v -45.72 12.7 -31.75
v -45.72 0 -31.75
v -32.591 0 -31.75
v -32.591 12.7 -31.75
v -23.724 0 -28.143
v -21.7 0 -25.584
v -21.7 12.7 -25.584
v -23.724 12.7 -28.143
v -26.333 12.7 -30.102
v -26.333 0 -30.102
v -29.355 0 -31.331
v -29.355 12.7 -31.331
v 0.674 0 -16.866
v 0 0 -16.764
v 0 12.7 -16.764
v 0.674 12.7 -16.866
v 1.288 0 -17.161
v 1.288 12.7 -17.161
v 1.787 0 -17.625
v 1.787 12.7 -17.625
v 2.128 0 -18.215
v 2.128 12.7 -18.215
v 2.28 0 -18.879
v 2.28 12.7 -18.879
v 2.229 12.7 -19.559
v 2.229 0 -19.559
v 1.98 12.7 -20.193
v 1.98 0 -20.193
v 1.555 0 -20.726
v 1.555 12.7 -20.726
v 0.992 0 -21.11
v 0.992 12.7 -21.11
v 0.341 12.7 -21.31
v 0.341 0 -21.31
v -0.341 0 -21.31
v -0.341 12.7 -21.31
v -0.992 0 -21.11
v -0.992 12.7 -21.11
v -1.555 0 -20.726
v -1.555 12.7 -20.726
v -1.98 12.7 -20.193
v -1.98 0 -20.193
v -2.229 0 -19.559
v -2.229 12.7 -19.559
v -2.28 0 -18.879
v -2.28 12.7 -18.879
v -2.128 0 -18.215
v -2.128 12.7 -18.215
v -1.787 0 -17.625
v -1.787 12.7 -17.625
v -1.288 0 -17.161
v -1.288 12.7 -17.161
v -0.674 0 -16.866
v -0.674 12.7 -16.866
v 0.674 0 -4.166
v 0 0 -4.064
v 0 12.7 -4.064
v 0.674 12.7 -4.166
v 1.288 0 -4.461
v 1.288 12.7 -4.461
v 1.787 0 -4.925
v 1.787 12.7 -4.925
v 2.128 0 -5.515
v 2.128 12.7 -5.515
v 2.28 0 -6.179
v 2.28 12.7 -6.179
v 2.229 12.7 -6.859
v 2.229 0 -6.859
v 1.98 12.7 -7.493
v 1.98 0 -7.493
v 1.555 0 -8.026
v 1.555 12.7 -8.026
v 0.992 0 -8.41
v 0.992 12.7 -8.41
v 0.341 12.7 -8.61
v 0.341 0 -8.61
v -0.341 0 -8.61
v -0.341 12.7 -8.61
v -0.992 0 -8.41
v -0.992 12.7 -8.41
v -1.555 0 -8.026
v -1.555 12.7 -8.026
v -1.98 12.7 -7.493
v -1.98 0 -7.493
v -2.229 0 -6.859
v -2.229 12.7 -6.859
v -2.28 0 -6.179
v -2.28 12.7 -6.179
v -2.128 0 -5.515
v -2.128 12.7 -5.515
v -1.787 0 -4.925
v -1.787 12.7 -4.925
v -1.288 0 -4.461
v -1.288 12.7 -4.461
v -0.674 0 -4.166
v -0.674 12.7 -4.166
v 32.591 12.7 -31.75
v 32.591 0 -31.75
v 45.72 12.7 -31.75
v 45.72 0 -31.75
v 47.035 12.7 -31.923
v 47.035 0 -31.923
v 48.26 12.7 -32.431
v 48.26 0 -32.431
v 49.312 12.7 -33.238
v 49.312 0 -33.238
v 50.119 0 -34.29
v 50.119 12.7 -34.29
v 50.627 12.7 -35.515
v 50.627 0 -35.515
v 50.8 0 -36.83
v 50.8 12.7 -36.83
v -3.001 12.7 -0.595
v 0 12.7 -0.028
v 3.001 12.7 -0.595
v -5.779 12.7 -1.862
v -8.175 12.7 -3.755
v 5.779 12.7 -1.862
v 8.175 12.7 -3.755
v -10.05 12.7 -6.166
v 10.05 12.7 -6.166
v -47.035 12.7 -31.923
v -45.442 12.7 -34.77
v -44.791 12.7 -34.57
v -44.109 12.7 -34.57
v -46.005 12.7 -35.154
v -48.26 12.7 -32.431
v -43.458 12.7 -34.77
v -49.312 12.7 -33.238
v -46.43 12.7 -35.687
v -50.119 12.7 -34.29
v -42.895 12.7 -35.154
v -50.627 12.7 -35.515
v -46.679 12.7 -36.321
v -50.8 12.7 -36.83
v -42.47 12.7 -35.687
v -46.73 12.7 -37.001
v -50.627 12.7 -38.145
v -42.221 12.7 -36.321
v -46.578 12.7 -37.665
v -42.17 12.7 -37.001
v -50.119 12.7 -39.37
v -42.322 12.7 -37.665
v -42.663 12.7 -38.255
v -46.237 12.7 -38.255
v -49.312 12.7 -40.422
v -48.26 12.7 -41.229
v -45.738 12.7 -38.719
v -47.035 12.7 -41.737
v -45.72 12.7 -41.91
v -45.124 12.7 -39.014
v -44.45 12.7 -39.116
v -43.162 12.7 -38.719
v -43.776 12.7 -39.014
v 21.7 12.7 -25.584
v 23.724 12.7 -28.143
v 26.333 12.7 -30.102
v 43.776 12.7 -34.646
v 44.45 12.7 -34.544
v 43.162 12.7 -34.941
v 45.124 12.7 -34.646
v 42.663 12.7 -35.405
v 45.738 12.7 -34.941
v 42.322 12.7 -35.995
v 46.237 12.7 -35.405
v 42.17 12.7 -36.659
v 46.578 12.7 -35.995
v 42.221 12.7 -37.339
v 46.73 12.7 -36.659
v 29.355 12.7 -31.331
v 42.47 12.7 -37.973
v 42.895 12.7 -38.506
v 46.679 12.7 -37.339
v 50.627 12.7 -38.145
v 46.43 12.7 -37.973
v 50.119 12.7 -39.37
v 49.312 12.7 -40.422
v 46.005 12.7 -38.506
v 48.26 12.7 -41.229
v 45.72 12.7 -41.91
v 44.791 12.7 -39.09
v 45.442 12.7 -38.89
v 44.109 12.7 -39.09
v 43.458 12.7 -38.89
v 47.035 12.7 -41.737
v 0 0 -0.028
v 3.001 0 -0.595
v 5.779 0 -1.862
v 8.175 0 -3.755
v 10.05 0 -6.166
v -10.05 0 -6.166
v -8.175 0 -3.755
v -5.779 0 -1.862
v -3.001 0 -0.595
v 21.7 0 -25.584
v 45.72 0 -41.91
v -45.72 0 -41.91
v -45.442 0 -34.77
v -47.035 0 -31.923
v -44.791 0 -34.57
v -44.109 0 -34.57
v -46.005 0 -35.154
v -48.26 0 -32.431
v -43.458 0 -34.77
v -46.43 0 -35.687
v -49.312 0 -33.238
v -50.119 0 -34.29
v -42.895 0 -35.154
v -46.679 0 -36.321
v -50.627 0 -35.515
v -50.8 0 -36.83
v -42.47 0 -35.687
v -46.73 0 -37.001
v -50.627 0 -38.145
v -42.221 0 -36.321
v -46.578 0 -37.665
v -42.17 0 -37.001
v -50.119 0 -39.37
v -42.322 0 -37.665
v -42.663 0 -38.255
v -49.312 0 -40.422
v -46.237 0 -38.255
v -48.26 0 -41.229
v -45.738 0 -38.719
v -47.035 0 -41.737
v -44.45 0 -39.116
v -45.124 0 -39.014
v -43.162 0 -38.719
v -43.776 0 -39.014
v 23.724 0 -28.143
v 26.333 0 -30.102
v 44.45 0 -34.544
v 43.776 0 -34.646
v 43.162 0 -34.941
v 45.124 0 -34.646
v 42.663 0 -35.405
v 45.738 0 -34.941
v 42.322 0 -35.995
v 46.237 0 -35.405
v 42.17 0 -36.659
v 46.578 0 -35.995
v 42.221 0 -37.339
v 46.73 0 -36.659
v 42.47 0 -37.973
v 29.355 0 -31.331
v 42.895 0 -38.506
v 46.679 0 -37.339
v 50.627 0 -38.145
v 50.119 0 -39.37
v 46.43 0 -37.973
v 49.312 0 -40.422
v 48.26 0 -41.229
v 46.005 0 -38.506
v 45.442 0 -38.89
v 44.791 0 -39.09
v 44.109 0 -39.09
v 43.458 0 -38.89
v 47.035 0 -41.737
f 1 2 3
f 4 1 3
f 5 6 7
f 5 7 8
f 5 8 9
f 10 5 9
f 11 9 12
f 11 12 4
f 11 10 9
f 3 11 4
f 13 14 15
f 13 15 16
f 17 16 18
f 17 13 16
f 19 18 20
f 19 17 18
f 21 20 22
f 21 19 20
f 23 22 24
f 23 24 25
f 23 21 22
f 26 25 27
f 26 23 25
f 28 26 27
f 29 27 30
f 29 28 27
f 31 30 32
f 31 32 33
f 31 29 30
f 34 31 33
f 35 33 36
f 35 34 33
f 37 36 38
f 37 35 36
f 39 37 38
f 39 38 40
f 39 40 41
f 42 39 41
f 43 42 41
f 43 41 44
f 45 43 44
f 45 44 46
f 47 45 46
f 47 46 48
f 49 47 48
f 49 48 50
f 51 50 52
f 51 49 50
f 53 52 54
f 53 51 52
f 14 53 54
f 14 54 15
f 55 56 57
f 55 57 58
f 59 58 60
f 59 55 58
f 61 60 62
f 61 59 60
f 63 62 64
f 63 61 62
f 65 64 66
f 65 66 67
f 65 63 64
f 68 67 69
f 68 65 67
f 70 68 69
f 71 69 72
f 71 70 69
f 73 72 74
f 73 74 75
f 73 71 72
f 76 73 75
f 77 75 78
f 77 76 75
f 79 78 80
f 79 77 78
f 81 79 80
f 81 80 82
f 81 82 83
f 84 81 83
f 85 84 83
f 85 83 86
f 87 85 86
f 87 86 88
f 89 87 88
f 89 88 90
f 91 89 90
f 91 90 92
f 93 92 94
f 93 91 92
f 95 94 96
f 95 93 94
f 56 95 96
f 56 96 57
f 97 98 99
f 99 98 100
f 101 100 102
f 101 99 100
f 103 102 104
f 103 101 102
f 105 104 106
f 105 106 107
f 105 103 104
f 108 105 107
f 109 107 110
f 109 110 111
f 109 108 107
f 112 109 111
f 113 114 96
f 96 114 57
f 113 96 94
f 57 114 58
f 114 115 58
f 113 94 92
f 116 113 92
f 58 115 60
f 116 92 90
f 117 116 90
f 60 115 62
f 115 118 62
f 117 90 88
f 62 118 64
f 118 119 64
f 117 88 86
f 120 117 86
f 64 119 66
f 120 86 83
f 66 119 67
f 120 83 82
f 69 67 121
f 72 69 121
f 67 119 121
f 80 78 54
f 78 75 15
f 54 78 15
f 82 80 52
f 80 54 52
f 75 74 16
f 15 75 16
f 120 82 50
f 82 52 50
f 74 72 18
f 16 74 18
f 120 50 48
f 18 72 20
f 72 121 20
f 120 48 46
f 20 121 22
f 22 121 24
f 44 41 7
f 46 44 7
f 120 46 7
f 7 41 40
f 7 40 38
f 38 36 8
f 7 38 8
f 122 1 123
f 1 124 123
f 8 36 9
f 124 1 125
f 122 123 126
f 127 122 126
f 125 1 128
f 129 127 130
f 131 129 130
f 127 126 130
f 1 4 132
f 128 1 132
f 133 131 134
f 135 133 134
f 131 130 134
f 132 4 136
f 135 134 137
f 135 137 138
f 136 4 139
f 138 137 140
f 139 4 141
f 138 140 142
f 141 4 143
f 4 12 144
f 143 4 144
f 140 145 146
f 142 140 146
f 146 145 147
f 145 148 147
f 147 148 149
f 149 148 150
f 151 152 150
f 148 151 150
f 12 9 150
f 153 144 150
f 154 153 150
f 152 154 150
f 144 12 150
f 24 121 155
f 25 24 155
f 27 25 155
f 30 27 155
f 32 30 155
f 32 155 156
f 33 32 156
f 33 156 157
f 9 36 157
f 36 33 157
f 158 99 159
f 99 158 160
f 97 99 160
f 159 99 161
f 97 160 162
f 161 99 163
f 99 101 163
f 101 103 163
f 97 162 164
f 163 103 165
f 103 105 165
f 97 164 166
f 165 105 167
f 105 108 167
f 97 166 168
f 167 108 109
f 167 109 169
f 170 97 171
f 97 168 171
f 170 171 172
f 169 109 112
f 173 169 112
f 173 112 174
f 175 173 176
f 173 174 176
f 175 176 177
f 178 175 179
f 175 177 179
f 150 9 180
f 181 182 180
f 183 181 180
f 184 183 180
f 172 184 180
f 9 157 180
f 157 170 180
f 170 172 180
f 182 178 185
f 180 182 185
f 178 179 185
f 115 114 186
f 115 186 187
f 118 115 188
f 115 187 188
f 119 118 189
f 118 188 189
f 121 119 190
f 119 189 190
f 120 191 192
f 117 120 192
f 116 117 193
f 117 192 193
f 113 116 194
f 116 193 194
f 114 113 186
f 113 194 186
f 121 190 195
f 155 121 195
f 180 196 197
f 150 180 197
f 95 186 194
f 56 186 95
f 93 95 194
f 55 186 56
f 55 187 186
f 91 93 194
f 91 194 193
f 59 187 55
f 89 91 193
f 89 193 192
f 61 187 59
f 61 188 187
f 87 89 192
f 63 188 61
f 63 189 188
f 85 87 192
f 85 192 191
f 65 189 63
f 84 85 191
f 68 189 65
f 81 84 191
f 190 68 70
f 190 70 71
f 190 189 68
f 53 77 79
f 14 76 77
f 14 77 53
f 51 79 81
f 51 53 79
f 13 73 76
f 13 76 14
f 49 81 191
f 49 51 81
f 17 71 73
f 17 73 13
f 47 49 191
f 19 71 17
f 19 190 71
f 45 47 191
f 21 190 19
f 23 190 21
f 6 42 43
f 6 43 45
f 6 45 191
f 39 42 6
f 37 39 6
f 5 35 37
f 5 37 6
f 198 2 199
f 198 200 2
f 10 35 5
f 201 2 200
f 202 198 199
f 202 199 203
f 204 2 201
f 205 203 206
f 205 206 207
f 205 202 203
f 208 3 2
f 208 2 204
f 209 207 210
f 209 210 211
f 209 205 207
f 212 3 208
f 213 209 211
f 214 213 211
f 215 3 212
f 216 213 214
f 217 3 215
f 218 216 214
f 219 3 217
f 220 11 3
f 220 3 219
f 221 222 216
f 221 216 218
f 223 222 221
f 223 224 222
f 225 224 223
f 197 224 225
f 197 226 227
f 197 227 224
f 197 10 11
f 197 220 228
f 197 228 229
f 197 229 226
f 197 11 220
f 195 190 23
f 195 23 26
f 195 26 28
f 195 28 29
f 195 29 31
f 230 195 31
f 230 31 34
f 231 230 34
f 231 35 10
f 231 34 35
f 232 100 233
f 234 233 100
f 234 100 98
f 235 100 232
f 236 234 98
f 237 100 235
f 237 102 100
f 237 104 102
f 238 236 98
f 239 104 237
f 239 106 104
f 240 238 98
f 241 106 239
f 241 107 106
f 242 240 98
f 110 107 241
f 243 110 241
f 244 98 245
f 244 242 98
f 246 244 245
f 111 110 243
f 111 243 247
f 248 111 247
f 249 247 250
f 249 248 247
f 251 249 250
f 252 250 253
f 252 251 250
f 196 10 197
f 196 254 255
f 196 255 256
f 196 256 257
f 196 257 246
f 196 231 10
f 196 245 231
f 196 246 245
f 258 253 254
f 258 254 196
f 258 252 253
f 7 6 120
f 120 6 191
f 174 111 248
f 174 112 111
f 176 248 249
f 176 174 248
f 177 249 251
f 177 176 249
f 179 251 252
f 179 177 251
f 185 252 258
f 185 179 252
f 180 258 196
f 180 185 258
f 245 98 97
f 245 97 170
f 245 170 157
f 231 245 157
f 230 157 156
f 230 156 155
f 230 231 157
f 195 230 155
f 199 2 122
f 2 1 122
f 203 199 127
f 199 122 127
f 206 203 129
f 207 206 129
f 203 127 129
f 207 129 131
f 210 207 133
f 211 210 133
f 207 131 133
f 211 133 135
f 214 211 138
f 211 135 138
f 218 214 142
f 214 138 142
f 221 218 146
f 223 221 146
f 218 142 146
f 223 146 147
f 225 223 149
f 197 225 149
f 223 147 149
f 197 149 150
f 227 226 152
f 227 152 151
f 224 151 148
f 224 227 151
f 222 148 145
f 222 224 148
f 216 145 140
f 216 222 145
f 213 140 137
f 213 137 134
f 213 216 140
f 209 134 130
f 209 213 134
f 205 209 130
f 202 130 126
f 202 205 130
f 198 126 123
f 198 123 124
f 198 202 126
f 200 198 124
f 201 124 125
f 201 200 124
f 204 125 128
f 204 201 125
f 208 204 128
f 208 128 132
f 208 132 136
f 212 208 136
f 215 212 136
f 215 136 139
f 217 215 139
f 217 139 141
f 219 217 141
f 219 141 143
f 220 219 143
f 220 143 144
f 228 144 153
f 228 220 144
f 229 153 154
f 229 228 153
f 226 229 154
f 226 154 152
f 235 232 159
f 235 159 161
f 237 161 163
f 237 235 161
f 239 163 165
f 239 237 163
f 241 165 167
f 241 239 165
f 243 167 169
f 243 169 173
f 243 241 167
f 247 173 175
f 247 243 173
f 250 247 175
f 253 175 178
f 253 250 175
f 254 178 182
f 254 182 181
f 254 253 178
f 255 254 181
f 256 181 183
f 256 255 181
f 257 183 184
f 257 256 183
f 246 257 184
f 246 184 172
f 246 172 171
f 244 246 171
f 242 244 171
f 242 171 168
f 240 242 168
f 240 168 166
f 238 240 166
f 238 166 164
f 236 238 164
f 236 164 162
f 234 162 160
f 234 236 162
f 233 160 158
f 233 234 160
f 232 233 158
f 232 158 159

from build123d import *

# Parameters (mm, degrees)
SKETCH2_R           = 2.286
BOSS_EXTRUDE2_DEPTH = 12.7
FILLET1_R           = 5.08
FILLET2_R           = 12.7


# Some blends are built 0.0001 mm under size
with BuildPart() as part:
    # Sketch2 → Boss-Extrude2 (new body)
    with BuildSketch(Plane(origin=(0, 0, 0), x_dir=(1, 0, 0), z_dir=(0, 1, 0))):
        Polygon((-6.35, 0), (6.35, 0), (25.4, 31.75), (50.8, 31.75), (50.8, 41.91), (-50.8, 41.91), (-50.8, 31.75), (-25.4, 31.75), align=None)
        with Locations(Location((0, 19.05, 0), (0, 0, 270))):
            Circle(SKETCH2_R, mode=Mode.SUBTRACT)
        with Locations(Location((0, 6.35, 0), (0, 0, 270))):
            Circle(SKETCH2_R, mode=Mode.SUBTRACT)
        with Locations(Location((44.45, 36.83, 0), (0, 0, 270))):
            Circle(SKETCH2_R, mode=Mode.SUBTRACT)
        with Locations(Location((-44.45, 36.83, 0), (0, 0, 90))):
            Circle(SKETCH2_R, mode=Mode.SUBTRACT)
    extrude(amount=BOSS_EXTRUDE2_DEPTH)

    # Fillet1
    fillet1_edges = [part.edges().sort_by_distance(p)[0] for p in [
        (50.8, 6.35, -41.91),
        (50.8, 6.35, -31.75),
        (-50.8, 6.35, -41.91),
        (-50.8, 6.35, -31.75),
    ]]
    fillet(fillet1_edges, radius=FILLET1_R - 0.0001)  # a hair under: the kernel refuses the full size

    # Fillet2
    # the kernel refuses this fillet: 12.7 mm, written as the material it adds along each edge
    with BuildSketch(Plane(origin=(-25.4, 0, -31.75), x_dir=(0.5144957554275261, 0, 0.8574929257125444), z_dir=(0, 1, 0)), Plane(origin=(25.4, 0, -31.75), x_dir=(1, 0, 0), z_dir=(0, 1, 0))) as fillet2_piece_1:
        with BuildLine():
            CenterArc((FILLET2_R * 0.566190378969, -FILLET2_R), FILLET2_R, 90, 59.036243468)
            Line((-FILLET2_R * 0.291302546743, -FILLET2_R * 0.485504244572), (0, 0))
            Line((0, 0), (FILLET2_R * 0.566190378969, 0))
        make_face()
    extrude(amount=12.7)
    # the kernel refuses this fillet: 12.7 mm, written as the material it takes off along each edge
    with BuildSketch(Plane(origin=(-6.35, -17.976544532, 0), x_dir=(1, 0, 0), z_dir=(0, 1, 0)), Plane(origin=(6.35, -17.976544532, 0), x_dir=(0.514495755427526, 0, -0.8574929257125444), z_dir=(0, 1, 0))) as fillet2_2_piece_1:
        with BuildLine():
            CenterArc((FILLET2_R * 0.566190378969, FILLET2_R), FILLET2_R, 210.963756532, 59.036243468)
            Line((-FILLET2_R * 0.291302546743, FILLET2_R * 0.485504244572), (0, 0))
            Line((0, 0), (FILLET2_R * 0.566190378969, 0))
        make_face()
    extrude(amount=48.653089065, mode=Mode.SUBTRACT)


solid = part.part
